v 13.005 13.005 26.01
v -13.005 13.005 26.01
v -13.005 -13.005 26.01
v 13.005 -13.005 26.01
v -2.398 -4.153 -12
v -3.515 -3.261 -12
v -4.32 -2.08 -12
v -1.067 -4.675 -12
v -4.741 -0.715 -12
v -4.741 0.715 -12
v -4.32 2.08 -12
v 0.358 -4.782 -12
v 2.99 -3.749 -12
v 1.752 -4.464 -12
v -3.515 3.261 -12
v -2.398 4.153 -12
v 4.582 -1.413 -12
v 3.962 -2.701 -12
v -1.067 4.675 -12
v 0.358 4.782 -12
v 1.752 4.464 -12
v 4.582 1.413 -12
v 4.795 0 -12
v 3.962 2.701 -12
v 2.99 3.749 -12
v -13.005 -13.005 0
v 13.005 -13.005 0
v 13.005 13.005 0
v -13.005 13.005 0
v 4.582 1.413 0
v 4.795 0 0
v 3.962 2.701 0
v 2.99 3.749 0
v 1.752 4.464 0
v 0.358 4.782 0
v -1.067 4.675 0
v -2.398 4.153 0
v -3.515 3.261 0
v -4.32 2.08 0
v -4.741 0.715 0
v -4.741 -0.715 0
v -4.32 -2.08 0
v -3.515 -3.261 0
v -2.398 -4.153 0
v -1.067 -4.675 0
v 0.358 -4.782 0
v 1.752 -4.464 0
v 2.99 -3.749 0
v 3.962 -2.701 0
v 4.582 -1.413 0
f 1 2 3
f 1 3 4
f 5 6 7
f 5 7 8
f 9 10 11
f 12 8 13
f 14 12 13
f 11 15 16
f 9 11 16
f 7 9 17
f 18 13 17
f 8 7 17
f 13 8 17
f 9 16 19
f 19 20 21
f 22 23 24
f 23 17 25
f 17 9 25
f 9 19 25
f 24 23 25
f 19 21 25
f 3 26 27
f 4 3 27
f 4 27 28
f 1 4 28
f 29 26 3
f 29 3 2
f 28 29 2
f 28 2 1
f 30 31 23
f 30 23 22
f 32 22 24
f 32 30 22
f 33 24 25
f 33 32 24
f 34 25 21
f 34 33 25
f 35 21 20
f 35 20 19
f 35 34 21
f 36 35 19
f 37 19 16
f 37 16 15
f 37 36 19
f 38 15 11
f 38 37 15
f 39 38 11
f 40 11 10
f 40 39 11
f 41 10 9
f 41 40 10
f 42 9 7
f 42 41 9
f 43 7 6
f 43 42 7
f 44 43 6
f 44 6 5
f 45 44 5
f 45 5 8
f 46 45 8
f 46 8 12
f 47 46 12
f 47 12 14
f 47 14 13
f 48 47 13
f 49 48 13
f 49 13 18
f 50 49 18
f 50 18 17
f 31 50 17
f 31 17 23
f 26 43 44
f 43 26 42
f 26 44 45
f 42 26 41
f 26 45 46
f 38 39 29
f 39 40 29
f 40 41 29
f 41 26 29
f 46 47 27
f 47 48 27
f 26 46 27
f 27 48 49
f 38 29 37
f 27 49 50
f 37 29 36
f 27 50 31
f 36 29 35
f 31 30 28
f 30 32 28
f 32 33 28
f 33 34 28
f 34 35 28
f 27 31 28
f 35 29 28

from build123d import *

# Parameters (mm, degrees)
F0_W     = 26.0096
F0_H     = 26.0096
F1_DEPTH = 26.0096
F2_R     = 4.795051
F3_DEPTH = 1.2
F4_DEPTH = 12


with BuildPart() as f1:
    # F0 (on Top) → F1 (new body)
    with BuildSketch(Plane.XY):
        Rectangle(F0_W, F0_H)
    extrude(amount=F1_DEPTH)

    # F2 (on Top) → F3 (join)
    with BuildSketch(Plane.XY):
        Circle(F2_R)
    extrude(amount=-F3_DEPTH)

    # F2 (on Top) → F4 (join)
    with BuildSketch(Plane.XY):
        Circle(F2_R)
    extrude(amount=-F4_DEPTH)


solid = f1.part
